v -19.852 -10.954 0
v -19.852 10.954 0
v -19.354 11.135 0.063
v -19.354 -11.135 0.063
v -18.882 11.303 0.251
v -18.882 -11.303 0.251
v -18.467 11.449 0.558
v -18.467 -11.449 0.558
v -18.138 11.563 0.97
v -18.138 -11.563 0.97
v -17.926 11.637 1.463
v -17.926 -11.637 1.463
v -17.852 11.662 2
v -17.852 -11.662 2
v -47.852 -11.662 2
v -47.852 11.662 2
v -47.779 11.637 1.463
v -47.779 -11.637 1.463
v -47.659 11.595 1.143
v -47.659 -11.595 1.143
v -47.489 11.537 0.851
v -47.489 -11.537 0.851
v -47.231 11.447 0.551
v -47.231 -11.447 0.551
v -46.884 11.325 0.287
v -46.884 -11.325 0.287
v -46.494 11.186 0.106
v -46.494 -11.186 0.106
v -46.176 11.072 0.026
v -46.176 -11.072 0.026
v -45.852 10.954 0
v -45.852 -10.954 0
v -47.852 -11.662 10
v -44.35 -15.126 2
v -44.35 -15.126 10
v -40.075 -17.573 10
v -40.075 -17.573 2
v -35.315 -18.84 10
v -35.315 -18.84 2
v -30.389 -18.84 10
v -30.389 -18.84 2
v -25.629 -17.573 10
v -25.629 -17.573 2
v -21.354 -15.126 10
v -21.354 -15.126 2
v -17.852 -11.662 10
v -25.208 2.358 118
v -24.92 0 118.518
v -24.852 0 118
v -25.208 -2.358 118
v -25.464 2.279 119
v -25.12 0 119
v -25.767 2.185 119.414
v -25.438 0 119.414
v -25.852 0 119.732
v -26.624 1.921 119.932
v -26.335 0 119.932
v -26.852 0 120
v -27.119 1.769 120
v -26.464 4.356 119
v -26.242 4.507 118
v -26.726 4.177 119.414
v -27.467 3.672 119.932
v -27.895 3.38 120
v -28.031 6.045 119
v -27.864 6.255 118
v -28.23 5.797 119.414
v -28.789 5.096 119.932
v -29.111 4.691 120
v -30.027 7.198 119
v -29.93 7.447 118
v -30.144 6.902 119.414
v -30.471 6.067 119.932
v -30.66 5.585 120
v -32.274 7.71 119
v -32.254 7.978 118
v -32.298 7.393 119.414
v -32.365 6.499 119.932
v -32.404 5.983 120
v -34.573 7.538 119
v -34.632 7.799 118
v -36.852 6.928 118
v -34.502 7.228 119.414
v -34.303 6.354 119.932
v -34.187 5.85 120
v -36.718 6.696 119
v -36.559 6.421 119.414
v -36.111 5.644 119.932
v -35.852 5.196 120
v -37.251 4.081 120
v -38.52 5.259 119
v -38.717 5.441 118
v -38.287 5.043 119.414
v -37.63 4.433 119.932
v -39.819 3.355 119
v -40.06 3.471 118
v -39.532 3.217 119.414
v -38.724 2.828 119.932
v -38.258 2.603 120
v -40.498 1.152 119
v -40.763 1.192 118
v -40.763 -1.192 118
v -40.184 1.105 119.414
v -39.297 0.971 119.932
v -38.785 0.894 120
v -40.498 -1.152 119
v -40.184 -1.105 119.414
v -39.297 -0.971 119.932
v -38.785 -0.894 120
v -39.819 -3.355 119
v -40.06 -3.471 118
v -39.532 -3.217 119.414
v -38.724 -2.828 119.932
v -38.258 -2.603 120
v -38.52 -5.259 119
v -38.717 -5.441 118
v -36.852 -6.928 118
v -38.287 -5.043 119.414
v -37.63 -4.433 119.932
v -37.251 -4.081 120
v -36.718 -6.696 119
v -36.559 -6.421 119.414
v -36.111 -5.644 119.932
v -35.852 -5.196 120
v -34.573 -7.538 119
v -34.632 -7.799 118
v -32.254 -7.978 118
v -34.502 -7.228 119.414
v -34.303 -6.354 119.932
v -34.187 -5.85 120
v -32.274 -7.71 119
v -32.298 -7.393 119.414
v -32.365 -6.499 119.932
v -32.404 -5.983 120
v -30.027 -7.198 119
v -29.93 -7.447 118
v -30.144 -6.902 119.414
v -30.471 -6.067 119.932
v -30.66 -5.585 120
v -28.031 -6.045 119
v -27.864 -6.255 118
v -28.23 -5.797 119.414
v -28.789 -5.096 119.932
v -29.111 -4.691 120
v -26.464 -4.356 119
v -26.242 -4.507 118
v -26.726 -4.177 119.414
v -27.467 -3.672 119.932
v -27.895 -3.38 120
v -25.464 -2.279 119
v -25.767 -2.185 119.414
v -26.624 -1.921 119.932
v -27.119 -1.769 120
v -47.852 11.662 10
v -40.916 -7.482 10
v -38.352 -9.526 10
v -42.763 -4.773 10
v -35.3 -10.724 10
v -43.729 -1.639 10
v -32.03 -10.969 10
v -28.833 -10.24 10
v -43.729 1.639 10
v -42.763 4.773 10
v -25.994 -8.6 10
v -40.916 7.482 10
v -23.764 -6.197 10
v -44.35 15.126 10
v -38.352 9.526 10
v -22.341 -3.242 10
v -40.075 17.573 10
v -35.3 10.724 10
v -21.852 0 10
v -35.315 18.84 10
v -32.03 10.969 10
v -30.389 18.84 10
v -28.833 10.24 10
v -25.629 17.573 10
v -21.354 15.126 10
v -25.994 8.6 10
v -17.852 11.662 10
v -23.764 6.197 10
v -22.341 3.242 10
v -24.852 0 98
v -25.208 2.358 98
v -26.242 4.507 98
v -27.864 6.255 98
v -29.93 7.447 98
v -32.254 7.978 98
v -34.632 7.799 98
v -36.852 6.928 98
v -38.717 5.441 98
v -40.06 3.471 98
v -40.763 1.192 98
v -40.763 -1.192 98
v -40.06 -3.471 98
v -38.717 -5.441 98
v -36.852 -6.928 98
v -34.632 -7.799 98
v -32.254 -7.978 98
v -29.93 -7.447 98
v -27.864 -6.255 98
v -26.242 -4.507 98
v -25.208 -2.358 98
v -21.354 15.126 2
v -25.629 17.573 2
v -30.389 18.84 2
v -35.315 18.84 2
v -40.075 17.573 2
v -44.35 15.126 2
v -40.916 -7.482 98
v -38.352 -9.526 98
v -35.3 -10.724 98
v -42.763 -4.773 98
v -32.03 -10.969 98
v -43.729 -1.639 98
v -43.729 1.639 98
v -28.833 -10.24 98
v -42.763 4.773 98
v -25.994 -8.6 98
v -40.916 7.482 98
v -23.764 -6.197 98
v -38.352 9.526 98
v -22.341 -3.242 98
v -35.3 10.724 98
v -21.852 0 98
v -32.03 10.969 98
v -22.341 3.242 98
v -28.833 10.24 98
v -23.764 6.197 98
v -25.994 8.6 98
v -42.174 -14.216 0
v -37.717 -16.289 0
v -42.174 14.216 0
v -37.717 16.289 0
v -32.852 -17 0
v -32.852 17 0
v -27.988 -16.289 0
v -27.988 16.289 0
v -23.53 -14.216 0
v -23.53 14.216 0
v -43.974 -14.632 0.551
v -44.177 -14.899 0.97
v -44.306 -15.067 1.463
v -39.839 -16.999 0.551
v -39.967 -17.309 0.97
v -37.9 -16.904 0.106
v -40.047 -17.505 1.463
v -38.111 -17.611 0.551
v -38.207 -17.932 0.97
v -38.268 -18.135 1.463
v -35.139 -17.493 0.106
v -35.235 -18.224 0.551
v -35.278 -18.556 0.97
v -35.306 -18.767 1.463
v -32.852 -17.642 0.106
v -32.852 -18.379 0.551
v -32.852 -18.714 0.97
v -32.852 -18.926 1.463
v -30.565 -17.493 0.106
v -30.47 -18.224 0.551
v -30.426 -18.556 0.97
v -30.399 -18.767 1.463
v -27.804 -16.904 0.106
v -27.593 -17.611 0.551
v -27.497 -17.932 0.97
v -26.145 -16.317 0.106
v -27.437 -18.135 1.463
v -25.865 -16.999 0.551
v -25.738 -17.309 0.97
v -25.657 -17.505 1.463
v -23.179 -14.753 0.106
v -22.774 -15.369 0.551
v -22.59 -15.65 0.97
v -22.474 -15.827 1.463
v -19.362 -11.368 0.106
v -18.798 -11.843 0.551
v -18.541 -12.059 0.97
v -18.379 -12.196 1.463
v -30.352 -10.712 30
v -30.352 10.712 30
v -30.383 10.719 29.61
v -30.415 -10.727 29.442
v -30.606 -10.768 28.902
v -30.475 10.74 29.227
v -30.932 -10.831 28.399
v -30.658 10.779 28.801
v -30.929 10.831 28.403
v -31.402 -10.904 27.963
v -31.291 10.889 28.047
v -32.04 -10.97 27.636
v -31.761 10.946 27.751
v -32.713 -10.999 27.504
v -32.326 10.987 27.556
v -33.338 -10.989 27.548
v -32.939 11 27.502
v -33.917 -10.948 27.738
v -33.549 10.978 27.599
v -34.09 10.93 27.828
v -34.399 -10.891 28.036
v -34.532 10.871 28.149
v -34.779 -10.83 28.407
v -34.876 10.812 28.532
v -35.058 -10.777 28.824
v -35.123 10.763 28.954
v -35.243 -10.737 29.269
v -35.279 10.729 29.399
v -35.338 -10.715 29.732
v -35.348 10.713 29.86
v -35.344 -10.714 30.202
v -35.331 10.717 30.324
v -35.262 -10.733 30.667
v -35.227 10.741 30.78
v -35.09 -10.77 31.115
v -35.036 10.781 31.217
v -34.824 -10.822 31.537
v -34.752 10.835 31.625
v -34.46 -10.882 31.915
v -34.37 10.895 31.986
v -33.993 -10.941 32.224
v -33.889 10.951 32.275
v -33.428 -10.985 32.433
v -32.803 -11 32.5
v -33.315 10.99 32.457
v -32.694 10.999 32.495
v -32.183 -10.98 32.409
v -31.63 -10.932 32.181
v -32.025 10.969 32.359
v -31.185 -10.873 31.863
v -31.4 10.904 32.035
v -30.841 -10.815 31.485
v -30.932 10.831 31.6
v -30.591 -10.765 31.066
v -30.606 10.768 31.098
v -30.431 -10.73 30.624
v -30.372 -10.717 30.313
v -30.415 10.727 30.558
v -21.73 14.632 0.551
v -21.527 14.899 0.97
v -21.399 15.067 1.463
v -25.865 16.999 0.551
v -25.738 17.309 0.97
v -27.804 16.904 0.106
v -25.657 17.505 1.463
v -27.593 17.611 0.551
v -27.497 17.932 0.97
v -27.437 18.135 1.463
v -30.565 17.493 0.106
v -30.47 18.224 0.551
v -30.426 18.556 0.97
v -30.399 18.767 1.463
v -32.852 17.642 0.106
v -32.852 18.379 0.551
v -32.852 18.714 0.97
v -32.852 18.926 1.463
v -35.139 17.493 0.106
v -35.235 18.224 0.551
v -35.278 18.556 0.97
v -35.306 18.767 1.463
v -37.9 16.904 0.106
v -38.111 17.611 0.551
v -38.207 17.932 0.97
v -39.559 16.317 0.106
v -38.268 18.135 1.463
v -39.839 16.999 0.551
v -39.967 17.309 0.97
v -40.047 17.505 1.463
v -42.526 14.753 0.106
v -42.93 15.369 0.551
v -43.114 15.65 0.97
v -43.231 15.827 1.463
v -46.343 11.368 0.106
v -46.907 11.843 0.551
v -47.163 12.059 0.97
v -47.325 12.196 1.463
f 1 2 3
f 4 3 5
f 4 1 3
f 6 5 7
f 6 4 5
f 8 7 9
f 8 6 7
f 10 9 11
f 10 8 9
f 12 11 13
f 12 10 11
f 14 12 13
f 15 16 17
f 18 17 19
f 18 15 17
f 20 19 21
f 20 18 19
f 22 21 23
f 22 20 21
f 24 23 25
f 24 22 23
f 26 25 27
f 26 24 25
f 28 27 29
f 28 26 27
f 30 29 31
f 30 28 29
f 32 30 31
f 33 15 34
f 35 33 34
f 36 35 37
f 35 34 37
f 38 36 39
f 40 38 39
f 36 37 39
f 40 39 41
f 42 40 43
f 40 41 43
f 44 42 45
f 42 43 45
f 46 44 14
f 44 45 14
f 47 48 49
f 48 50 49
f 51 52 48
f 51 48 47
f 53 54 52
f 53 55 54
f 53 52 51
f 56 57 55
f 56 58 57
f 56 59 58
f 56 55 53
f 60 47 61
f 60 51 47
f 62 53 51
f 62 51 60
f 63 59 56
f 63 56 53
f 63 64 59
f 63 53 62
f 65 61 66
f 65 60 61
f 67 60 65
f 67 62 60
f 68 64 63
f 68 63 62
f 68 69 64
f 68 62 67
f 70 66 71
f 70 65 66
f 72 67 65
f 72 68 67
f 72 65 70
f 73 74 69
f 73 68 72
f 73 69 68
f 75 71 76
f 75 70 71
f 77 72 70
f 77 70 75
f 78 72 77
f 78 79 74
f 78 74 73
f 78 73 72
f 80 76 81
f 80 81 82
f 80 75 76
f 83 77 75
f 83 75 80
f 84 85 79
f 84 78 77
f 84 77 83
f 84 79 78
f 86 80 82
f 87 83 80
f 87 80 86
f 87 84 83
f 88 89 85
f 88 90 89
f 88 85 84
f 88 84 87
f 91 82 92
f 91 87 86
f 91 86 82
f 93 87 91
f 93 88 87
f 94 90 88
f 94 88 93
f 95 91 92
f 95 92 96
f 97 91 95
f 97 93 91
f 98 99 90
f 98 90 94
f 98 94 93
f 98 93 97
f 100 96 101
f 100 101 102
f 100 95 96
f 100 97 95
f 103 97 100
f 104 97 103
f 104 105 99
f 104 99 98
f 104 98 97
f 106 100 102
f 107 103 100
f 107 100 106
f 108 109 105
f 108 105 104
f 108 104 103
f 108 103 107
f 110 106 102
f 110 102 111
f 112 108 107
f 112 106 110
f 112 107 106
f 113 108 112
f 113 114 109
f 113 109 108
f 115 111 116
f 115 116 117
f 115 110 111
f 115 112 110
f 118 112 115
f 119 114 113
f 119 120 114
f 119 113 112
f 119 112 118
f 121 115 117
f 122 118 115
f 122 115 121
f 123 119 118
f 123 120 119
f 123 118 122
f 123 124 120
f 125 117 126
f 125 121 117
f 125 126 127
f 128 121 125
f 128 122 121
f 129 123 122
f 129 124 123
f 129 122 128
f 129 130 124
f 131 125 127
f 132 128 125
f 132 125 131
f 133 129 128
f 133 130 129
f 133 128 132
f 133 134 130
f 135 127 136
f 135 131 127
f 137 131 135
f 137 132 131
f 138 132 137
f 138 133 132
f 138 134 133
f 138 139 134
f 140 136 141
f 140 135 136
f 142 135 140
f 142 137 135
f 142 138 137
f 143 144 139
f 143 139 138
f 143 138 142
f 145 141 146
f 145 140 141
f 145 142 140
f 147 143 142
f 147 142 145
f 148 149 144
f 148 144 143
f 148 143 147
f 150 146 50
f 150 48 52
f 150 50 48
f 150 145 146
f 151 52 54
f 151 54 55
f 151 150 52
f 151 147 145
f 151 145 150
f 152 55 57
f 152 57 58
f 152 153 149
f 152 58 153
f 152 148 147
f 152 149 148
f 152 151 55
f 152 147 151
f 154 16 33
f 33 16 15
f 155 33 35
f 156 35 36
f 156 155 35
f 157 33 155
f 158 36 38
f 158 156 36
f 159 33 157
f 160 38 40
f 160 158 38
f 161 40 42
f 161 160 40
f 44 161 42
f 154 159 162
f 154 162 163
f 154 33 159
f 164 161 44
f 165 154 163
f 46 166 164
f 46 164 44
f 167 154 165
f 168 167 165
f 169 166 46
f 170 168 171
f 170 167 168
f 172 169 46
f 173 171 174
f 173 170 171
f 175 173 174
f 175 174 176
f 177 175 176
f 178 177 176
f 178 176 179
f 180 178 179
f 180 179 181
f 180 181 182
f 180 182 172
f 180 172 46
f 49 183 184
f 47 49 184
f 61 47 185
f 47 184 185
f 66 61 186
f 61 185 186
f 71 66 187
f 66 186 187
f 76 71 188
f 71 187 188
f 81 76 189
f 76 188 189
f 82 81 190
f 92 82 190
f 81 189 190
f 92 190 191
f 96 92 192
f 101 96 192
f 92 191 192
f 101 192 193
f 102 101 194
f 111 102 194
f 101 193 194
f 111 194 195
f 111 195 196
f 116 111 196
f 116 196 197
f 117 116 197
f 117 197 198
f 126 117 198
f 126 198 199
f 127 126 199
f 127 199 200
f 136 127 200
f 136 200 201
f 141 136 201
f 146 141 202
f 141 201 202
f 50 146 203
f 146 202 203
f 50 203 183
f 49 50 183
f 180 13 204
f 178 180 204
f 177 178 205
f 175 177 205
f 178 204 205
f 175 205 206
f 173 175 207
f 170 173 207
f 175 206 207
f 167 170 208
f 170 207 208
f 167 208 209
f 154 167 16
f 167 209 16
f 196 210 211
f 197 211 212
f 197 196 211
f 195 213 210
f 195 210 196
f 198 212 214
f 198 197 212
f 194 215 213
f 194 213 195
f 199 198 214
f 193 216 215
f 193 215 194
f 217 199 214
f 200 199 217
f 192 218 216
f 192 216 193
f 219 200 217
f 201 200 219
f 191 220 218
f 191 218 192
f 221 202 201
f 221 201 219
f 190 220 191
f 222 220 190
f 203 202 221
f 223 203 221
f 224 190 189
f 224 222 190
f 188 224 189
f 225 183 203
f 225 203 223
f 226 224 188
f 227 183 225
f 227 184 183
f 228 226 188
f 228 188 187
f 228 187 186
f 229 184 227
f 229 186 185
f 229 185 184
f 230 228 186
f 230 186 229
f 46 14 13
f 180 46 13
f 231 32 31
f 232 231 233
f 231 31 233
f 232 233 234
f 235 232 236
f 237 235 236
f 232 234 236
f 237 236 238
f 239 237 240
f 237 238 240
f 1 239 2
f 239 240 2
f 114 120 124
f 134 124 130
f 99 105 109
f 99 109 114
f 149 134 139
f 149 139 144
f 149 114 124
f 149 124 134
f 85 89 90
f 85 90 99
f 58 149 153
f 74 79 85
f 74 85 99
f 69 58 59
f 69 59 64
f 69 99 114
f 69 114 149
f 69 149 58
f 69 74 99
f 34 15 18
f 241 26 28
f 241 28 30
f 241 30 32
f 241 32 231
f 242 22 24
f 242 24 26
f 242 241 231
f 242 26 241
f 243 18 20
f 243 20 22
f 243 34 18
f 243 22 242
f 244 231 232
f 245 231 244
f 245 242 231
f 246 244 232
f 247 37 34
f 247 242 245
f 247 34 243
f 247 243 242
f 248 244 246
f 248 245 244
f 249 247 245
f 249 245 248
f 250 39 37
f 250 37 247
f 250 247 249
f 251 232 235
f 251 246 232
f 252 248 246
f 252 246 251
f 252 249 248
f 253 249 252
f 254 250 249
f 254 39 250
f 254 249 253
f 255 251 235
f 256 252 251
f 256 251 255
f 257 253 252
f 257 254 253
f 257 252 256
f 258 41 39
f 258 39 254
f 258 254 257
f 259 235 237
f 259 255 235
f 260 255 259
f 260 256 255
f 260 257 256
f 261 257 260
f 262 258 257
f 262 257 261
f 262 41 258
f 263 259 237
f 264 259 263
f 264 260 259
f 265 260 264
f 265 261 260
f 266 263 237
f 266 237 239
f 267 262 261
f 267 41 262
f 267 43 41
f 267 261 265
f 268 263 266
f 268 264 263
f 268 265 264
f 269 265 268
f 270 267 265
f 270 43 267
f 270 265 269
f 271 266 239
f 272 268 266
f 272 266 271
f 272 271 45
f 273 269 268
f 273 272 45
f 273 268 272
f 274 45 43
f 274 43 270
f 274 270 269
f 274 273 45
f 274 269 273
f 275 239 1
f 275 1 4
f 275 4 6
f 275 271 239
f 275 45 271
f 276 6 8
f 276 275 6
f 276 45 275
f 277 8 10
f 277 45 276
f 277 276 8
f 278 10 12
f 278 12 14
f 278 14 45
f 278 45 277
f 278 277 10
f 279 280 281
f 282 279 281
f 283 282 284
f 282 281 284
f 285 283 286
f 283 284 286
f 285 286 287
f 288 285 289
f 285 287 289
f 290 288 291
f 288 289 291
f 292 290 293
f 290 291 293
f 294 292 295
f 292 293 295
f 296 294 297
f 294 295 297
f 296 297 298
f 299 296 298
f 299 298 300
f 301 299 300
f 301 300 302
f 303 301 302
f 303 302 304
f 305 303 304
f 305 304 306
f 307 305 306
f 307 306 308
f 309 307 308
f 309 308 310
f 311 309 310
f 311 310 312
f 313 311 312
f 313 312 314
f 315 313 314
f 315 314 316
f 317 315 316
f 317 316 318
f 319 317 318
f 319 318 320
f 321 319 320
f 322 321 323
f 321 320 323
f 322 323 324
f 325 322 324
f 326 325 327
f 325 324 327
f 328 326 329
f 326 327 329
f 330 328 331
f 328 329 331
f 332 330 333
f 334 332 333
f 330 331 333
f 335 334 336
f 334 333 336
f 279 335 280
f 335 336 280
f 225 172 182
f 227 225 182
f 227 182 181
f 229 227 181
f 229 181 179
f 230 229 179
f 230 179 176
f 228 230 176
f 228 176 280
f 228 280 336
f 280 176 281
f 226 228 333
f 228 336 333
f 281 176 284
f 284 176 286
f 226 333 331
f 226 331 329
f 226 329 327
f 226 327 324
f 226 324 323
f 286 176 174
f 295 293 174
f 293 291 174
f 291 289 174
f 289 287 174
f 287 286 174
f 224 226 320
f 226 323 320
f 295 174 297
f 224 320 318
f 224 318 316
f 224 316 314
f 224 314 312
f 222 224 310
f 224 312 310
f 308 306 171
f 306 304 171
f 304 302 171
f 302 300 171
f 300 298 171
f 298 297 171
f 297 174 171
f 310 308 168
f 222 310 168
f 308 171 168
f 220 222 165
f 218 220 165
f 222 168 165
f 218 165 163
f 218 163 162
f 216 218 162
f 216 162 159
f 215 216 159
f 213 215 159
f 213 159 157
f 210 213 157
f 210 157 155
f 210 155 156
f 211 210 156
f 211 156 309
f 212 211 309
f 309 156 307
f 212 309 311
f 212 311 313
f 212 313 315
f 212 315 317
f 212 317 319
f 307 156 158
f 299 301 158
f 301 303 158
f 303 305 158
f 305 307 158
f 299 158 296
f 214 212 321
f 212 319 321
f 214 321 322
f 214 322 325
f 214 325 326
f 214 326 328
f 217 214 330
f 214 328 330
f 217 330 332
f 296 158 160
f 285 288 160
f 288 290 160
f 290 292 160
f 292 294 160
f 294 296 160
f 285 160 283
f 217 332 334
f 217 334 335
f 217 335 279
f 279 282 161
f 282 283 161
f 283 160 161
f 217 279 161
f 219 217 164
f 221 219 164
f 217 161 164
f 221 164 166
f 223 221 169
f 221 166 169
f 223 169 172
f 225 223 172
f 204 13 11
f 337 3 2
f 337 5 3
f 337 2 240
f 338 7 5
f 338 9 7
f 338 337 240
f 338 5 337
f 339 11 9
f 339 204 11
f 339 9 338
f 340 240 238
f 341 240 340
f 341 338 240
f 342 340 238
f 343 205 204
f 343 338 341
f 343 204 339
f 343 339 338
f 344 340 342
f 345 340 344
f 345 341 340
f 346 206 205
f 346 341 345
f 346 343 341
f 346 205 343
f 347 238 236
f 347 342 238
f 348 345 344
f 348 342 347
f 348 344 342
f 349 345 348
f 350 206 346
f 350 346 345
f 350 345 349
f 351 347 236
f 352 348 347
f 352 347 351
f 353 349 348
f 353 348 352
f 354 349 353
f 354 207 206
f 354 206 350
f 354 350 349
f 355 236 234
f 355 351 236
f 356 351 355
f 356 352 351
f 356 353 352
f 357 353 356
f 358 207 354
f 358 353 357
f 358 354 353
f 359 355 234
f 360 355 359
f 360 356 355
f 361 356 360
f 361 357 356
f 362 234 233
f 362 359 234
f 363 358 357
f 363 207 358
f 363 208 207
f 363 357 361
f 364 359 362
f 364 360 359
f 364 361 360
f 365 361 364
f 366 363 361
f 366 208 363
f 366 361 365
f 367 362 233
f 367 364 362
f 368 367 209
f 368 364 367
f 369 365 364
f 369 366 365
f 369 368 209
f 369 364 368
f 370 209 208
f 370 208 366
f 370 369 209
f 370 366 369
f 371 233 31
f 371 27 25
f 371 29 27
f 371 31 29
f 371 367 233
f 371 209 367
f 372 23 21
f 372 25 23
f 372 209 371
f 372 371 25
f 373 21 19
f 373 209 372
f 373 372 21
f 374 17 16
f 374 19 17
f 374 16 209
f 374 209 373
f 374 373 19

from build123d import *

# Parameters (mm, degrees)
SKETCH1_R           = 8
BOSS_EXTRUDE1_DEPTH = 120
SKETCH1_3_R         = 11
SKETCH1_3_R_2       = 8
BOSS_EXTRUDE2_DEPTH = 98
SKETCH1_4_R         = 11
BOSS_EXTRUDE3_DEPTH = 10
BOSS_EXTRUDE4_DEPTH = 10
FILLET5_R           = 2
FILLET6_R           = 2
CUT_EXTRUDE1_DEPTH  = 100


with BuildPart() as part:
    # Sketch1 → Boss-Extrude1 (new body)
    with BuildSketch(Plane.XY):
        with Locations((-32.852244642, 0)):
            Circle(SKETCH1_R)
    extrude(amount=BOSS_EXTRUDE1_DEPTH)

    # Sketch1<3> → Boss-Extrude2 (add)
    with BuildSketch(Plane.XY):
        with Locations((-32.852244642, 0)):
            Circle(SKETCH1_3_R)
        with Locations((-32.852244642, 0)):
            Circle(SKETCH1_3_R_2, mode=Mode.SUBTRACT)
    extrude(amount=BOSS_EXTRUDE2_DEPTH)

    # Sketch1<4> → Boss-Extrude3 (add)
    with BuildSketch(Plane.XY):
        with BuildLine():
            Line((-17.852244642, -9.949874371), (-17.852244642, 9.949874371))
            ThreePointArc((-17.852244642, 9.949874371), (-32.852244642, 18), (-47.852244642, 9.949874371))
            Line((-47.852244642, 9.949874371), (-47.852244642, -9.949874371))
            ThreePointArc((-47.852244642, -9.949874371), (-32.852244642, -18), (-17.852244642, -9.949874371))
        make_face()
        with Locations((-32.852244642, 0)):
            Circle(SKETCH1_4_R, mode=Mode.SUBTRACT)
    extrude(amount=BOSS_EXTRUDE3_DEPTH)

    # Sketch1<6> → Boss-Extrude4 (add)
    with BuildSketch(Plane.XY):
        with BuildLine():
            Line((-47.852244642, 11.66190379), (-47.852244642, 9.949874371))
            ThreePointArc((-47.852244642, 9.949874371), (-32.852244642, 18), (-17.852244642, 9.949874371))
            Line((-17.852244642, 9.949874371), (-17.852244642, 11.66190379))
            ThreePointArc((-17.852244642, 11.66190379), (-32.852244642, 19), (-47.852244642, 11.66190379))
        make_face()
        with BuildLine():
            ThreePointArc((-17.852244642, -9.949874371), (-32.852244642, -18), (-47.852244642, -9.949874371))
            Line((-47.852244642, -9.949874371), (-47.852244642, -11.66190379))
            ThreePointArc((-47.852244642, -11.66190379), (-32.852244642, -19), (-17.852244642, -11.66190379))
            Line((-17.852244642, -11.66190379), (-17.852244642, -9.949874371))
        make_face()
    extrude(amount=BOSS_EXTRUDE4_DEPTH)

    # Fillet5
    fillet5_edges = [part.edges().sort_by_distance(p)[0] for p in [
        (-32.852244642, -19, 0),
        (-17.852244642, 0, 0),
        (-32.852244642, 19, 0),
        (-47.852244642, 0, 0),
    ]]
    fillet(fillet5_edges, radius=FILLET5_R)

    # Fillet6
    fillet6_edges = [part.edges().sort_by_distance(p)[0] for p in [
        (-40.852244642, 0, 120),
    ]]
    fillet(fillet6_edges, radius=FILLET6_R)

    # Sketch2 → Cut-Extrude1 (cut)
    with BuildSketch(Plane(origin=(0, 11, 0), x_dir=(1, 0, 0), z_dir=(0, 1, 0))):
        with BuildLine():
            ThreePointArc((-32.852244642, -27.5), (-34.620011595, -31.767766953), (-30.352244642, -30))
            ThreePointArc((-30.352244642, -30), (-31.084477689, -28.232233047), (-32.852244642, -27.5))
        make_face()
    extrude(amount=-CUT_EXTRUDE1_DEPTH, mode=Mode.SUBTRACT)


solid = part.part
